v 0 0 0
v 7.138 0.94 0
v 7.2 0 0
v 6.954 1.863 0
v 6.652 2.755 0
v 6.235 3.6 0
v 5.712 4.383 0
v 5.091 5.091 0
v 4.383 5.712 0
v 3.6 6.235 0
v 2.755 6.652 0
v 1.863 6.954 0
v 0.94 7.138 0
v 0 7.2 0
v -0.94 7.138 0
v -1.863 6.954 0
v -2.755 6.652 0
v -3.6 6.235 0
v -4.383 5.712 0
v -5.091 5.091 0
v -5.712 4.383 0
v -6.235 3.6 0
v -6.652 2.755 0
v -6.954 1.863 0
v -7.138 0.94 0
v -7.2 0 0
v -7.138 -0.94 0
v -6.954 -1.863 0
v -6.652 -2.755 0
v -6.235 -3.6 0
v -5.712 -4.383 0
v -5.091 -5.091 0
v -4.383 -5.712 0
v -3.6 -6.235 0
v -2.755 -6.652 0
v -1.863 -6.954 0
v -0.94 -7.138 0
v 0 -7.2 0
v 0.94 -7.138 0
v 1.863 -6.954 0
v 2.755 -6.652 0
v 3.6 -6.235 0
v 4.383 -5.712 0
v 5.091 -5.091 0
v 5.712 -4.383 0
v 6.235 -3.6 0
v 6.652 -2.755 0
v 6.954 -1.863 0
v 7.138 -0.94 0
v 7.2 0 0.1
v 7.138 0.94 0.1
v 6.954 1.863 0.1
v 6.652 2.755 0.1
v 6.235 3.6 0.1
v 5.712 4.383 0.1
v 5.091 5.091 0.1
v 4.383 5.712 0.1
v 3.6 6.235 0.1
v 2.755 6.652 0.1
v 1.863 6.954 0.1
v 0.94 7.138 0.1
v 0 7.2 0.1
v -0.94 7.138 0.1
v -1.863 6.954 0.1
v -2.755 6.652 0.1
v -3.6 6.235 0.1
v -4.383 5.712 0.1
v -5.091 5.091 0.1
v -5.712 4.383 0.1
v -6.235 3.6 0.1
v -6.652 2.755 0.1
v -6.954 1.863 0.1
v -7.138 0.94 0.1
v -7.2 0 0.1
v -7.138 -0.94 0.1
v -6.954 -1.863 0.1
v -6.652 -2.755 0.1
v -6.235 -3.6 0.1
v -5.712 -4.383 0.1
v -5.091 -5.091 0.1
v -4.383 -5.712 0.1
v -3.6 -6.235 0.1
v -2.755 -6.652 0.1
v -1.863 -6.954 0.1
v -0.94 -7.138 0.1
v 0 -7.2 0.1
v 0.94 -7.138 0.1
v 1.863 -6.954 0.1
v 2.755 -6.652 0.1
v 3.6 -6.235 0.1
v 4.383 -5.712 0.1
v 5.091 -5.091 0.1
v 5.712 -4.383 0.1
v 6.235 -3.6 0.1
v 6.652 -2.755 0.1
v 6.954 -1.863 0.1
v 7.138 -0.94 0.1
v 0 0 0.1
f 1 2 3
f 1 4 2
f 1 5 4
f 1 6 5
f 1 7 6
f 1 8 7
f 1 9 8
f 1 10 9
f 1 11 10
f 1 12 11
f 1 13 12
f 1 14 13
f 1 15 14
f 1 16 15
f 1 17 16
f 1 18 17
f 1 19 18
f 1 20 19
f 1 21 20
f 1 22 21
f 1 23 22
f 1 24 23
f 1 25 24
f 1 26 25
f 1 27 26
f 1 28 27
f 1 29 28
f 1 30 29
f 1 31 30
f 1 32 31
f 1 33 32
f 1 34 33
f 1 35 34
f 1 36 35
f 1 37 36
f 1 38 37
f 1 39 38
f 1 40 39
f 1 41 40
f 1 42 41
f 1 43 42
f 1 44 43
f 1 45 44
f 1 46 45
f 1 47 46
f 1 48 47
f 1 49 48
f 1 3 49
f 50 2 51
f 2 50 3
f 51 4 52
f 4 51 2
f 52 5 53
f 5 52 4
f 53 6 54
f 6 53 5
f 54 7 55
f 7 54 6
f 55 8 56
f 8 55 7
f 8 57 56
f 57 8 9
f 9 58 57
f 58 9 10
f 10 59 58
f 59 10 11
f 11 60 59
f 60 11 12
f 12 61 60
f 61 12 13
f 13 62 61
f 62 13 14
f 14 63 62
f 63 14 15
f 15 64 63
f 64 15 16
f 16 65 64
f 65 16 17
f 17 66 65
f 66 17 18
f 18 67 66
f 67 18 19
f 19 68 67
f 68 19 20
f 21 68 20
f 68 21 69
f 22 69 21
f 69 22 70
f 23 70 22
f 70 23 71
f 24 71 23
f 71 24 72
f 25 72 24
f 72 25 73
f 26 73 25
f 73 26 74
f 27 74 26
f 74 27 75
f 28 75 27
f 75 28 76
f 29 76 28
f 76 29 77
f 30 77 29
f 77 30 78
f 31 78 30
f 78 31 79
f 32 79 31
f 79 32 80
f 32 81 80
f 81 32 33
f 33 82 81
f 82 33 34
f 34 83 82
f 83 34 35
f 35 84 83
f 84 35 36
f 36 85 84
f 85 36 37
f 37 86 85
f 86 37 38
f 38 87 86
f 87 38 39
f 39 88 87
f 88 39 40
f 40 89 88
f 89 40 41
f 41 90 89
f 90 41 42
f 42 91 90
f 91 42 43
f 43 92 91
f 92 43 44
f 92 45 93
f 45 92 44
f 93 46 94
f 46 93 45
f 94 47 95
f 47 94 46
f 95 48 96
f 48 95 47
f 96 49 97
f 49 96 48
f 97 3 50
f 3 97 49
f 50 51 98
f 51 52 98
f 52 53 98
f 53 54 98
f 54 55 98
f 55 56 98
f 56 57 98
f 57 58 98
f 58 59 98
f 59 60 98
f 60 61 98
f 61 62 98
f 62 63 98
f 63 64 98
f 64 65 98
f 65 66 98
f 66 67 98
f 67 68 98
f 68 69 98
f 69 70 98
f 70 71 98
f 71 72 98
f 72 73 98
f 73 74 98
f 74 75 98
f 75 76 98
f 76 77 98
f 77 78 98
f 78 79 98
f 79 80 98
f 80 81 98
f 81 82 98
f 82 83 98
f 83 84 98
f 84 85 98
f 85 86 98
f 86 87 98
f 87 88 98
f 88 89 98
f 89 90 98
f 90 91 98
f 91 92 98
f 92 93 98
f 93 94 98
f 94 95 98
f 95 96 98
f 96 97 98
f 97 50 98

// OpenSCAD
// file: ../p/48/1-4cyli.scad
use <../../lib.scad>
function ldraw_lib__48__1_4cyli() = [
// 0 Hi-Res Cylinder 0.25
// 0 Name: 48\1-4cyli.dat
// 0 Author: Manfred Moolhuysen
// 0 !LDRAW_ORG 48_Primitive UPDATE 2009-01
// 0 !LICENSE Licensed under CC BY 2.0 and CC BY 4.0 : see CAreadme.txt
// 
// 0 BFC CERTIFY CCW
  [0,"BFC","CERTIFY"],
  [0,"BFC","CCW"],
// 
// 0 !HISTORY 1999-07-05 [PTadmin] Official Update 1999-05
// 0 !HISTORY 2002-02-28 [hafhead] Added BFC statement
// 0 !HISTORY 2002-04-25 [PTadmin] Official Update 2002-02
// 0 !HISTORY 2007-06-24 [PTadmin] Header formatted for Contributor Agreement
// 0 !HISTORY 2008-07-01 [PTadmin] Official Update 2008-01
// 0 !HISTORY 2008-07-07 [guyvivan] Made BFC'ed CCW (2005-12-06)
// 0 !HISTORY 2009-05-02 [PTadmin] Official Update 2009-01
// 
// 
// 4 16 0.9914 0 0.1305 1 0 0 1 1 0 0.9914 1 0.1305
  [4,16,0.9914,0,0.1305,1,0,0,1,1,0,0.9914,1,0.1305],
// 4 16 0.9659 0 0.2588 0.9914 0 0.1305 0.9914 1 0.1305 0.9659 1 0.2588
  [4,16,0.9659,0,0.2588,0.9914,0,0.1305,0.9914,1,0.1305,0.9659,1,0.2588],
// 4 16 0.9239 0 0.3827 0.9659 0 0.2588 0.9659 1 0.2588 0.9239 1 0.3827
  [4,16,0.9239,0,0.3827,0.9659,0,0.2588,0.9659,1,0.2588,0.9239,1,0.3827],
// 4 16 0.866 0 0.5 0.9239 0 0.3827 0.9239 1 0.3827 0.866 1 0.5
  [4,16,0.866,0,0.5,0.9239,0,0.3827,0.9239,1,0.3827,0.866,1,0.5],
// 4 16 0.7934 0 0.6088 0.866 0 0.5 0.866 1 0.5 0.7934 1 0.6088
  [4,16,0.7934,0,0.6088,0.866,0,0.5,0.866,1,0.5,0.7934,1,0.6088],
// 4 16 0.7071 0 0.7071 0.7934 0 0.6088 0.7934 1 0.6088 0.7071 1 0.7071
  [4,16,0.7071,0,0.7071,0.7934,0,0.6088,0.7934,1,0.6088,0.7071,1,0.7071],
// 4 16 0.6088 0 0.7934 0.7071 0 0.7071 0.7071 1 0.7071 0.6088 1 0.7934
  [4,16,0.6088,0,0.7934,0.7071,0,0.7071,0.7071,1,0.7071,0.6088,1,0.7934],
// 4 16 0.5 0 0.866 0.6088 0 0.7934 0.6088 1 0.7934 0.5 1 0.866
  [4,16,0.5,0,0.866,0.6088,0,0.7934,0.6088,1,0.7934,0.5,1,0.866],
// 4 16 0.3827 0 0.9239 0.5 0 0.866 0.5 1 0.866 0.3827 1 0.9239
  [4,16,0.3827,0,0.9239,0.5,0,0.866,0.5,1,0.866,0.3827,1,0.9239],
// 4 16 0.2588 0 0.9659 0.3827 0 0.9239 0.3827 1 0.9239 0.2588 1 0.9659
  [4,16,0.2588,0,0.9659,0.3827,0,0.9239,0.3827,1,0.9239,0.2588,1,0.9659],
// 4 16 0.1305 0 0.9914 0.2588 0 0.9659 0.2588 1 0.9659 0.1305 1 0.9914
  [4,16,0.1305,0,0.9914,0.2588,0,0.9659,0.2588,1,0.9659,0.1305,1,0.9914],
// 4 16 0 0 1 0.1305 0 0.9914 0.1305 1 0.9914 0 1 1
  [4,16,0,0,1,0.1305,0,0.9914,0.1305,1,0.9914,0,1,1],
// 
// 0 conditional lines
// 5 24 1 1 0 1 0 0 1 1 -1 0.9914 1 0.1305
  [5,24,1,1,0,1,0,0,1,1,-1,0.9914,1,0.1305],
// 5 24 0.9914 1 0.1305 0.9914 0 0.1305 1 1 0 0.9659 1 0.2588
  [5,24,0.9914,1,0.1305,0.9914,0,0.1305,1,1,0,0.9659,1,0.2588],
// 5 24 0.9659 1 0.2588 0.9659 0 0.2588 0.9914 1 0.1305 0.9239 1 0.3827
  [5,24,0.9659,1,0.2588,0.9659,0,0.2588,0.9914,1,0.1305,0.9239,1,0.3827],
// 5 24 0.9239 1 0.3827 0.9239 0 0.3827 0.9659 1 0.2588 0.866 1 0.5
  [5,24,0.9239,1,0.3827,0.9239,0,0.3827,0.9659,1,0.2588,0.866,1,0.5],
// 5 24 0.866 1 0.5 0.866 0 0.5 0.9239 1 0.3827 0.7934 1 0.6088
  [5,24,0.866,1,0.5,0.866,0,0.5,0.9239,1,0.3827,0.7934,1,0.6088],
// 5 24 0.7934 1 0.6088 0.7934 0 0.6088 0.866 1 0.5 0.7071 1 0.7071
  [5,24,0.7934,1,0.6088,0.7934,0,0.6088,0.866,1,0.5,0.7071,1,0.7071],
// 5 24 0.7071 1 0.7071 0.7071 0 0.7071 0.7934 1 0.6088 0.6088 1 0.7934
  [5,24,0.7071,1,0.7071,0.7071,0,0.7071,0.7934,1,0.6088,0.6088,1,0.7934],
// 5 24 0.6088 1 0.7934 0.6088 0 0.7934 0.7071 1 0.7071 0.5 1 0.866
  [5,24,0.6088,1,0.7934,0.6088,0,0.7934,0.7071,1,0.7071,0.5,1,0.866],
// 5 24 0.5 1 0.866 0.5 0 0.866 0.6088 1 0.7934 0.3827 1 0.9239
  [5,24,0.5,1,0.866,0.5,0,0.866,0.6088,1,0.7934,0.3827,1,0.9239],
// 5 24 0.3827 1 0.9239 0.3827 0 0.9239 0.5 1 0.866 0.2588 1 0.9659
  [5,24,0.3827,1,0.9239,0.3827,0,0.9239,0.5,1,0.866,0.2588,1,0.9659],
// 5 24 0.2588 1 0.9659 0.2588 0 0.9659 0.3827 1 0.9239 0.1305 1 0.9914
  [5,24,0.2588,1,0.9659,0.2588,0,0.9659,0.3827,1,0.9239,0.1305,1,0.9914],
// 5 24 0.1305 1 0.9914 0.1305 0 0.9914 0.2588 1 0.9659 0 1 1
  [5,24,0.1305,1,0.9914,0.1305,0,0.9914,0.2588,1,0.9659,0,1,1],
// 5 24 0 1 1 0 0 1 0.1305 1 0.9914 -1 1 1
  [5,24,0,1,1,0,0,1,0.1305,1,0.9914,-1,1,1],
// 
// 0 end of file
];
module ldraw_lib__48__1_4cyli(step=0, col=false, unit=2/5, alt=false, line=0.2, solid=!$preview)
    makepoly(ldraw_lib__48__1_4cyli(), step=step, col=col, unit=unit, alt=alt, line=line, solid=solid);
ldraw_lib__48__1_4cyli(line=0.2);
// file: ../p/48/4-4cyli.scad
use <../../lib.scad>
use <1-4cyli.scad>
function ldraw_lib__48__4_4cyli() = [
// 0 Hi-Res Cylinder 1.0
// 0 Name: 48\4-4cyli.dat
// 0 Author: Paul Easter [pneaster]
// 0 !LDRAW_ORG 48_Primitive UPDATE 2012-02
// 0 !LICENSE Licensed under CC BY 2.0 and CC BY 4.0 : see CAreadme.txt
// 
// 0 BFC CERTIFY CCW
  [0,"BFC","CERTIFY"],
  [0,"BFC","CCW"],
// 
// 0 !HISTORY 2002-08-18 [PTadmin] Official Update 2002-04
// 0 !HISTORY 2007-06-24 [PTadmin] Header formatted for Contributor Agreement
// 0 !HISTORY 2008-07-01 [PTadmin] Official Update 2008-01
// 0 !HISTORY 2012-02-27 [Philo] Changed to CCW
// 0 !HISTORY 2012-08-09 [PTadmin] Official Update 2012-02
// 
// 
// 1 16 0 0 0 1 0 0 0 1 0 0 0 1 48\1-4cyli.dat
  [1,16,0,0,0,1,0,0,0,1,0,0,0,1, ldraw_lib__48__1_4cyli()],
// 1 16 0 0 0 0 0 -1 0 1 0 1 0 0 48\1-4cyli.dat
  [1,16,0,0,0,0,0,-1,0,1,0,1,0,0, ldraw_lib__48__1_4cyli()],
// 1 16 0 0 0 -1 0 0 0 1 0 0 0 -1 48\1-4cyli.dat
  [1,16,0,0,0,-1,0,0,0,1,0,0,0,-1, ldraw_lib__48__1_4cyli()],
// 1 16 0 0 0 0 0 1 0 1 0 -1 0 0 48\1-4cyli.dat
  [1,16,0,0,0,0,0,1,0,1,0,-1,0,0, ldraw_lib__48__1_4cyli()],
];
module ldraw_lib__48__4_4cyli(step=0, col=false, unit=2/5, alt=false, line=0.2, solid=!$preview)
    makepoly(ldraw_lib__48__4_4cyli(), step=step, col=col, unit=unit, alt=alt, line=line, solid=solid);
ldraw_lib__48__4_4cyli(line=0.2);
// file: ../p/48/4-4disc.scad
use <../../lib.scad>
function ldraw_lib__48__4_4disc() = [
// 0 Hi-Res Disc 1.0
// 0 Name: 48\4-4disc.dat
// 0 Author: Miklos Hosszu [hmick]
// 0 !LDRAW_ORG 48_Primitive UPDATE 2012-02
// 0 !LICENSE Licensed under CC BY 2.0 and CC BY 4.0 : see CAreadme.txt
// 
// 0 BFC CERTIFY CCW
  [0,"BFC","CERTIFY"],
  [0,"BFC","CCW"],
// 
// 0 !HISTORY 2004-11-06 [PTadmin] Official Update 2004-04
// 0 !HISTORY 2007-06-24 [PTadmin] Header formatted for Contributor Agreement
// 0 !HISTORY 2008-07-01 [PTadmin] Official Update 2008-01
// 0 !HISTORY 2012-02-27 [Philo] Changed to CCW
// 0 !HISTORY 2012-08-09 [PTadmin] Official Update 2012-02
// 
// 
// 3 16 1 0 0 0.9914 0 0.1305 0 0 0
  [3,16,1,0,0,0.9914,0,0.1305,0,0,0],
// 3 16 0.9914 0 0.1305 0.9659 0 0.2588 0 0 0
  [3,16,0.9914,0,0.1305,0.9659,0,0.2588,0,0,0],
// 3 16 0.9659 0 0.2588 0.9239 0 0.3827 0 0 0
  [3,16,0.9659,0,0.2588,0.9239,0,0.3827,0,0,0],
// 3 16 0.9239 0 0.3827 0.866 0 0.5 0 0 0
  [3,16,0.9239,0,0.3827,0.866,0,0.5,0,0,0],
// 3 16 0.866 0 0.5 0.7934 0 0.6088 0 0 0
  [3,16,0.866,0,0.5,0.7934,0,0.6088,0,0,0],
// 3 16 0.7934 0 0.6088 0.7071 0 0.7071 0 0 0
  [3,16,0.7934,0,0.6088,0.7071,0,0.7071,0,0,0],
// 3 16 0.7071 0 0.7071 0.6088 0 0.7934 0 0 0
  [3,16,0.7071,0,0.7071,0.6088,0,0.7934,0,0,0],
// 3 16 0.6088 0 0.7934 0.5 0 0.866 0 0 0
  [3,16,0.6088,0,0.7934,0.5,0,0.866,0,0,0],
// 3 16 0.5 0 0.866 0.3827 0 0.9239 0 0 0
  [3,16,0.5,0,0.866,0.3827,0,0.9239,0,0,0],
// 3 16 0.3827 0 0.9239 0.2588 0 0.9659 0 0 0
  [3,16,0.3827,0,0.9239,0.2588,0,0.9659,0,0,0],
// 3 16 0.2588 0 0.9659 0.1305 0 0.9914 0 0 0
  [3,16,0.2588,0,0.9659,0.1305,0,0.9914,0,0,0],
// 3 16 0.1305 0 0.9914 0 0 1 0 0 0
  [3,16,0.1305,0,0.9914,0,0,1,0,0,0],
// 3 16 0 0 1 -0.1305 0 0.9914 0 0 0
  [3,16,0,0,1,-0.1305,0,0.9914,0,0,0],
// 3 16 -0.1305 0 0.9914 -0.2588 0 0.9659 0 0 0
  [3,16,-0.1305,0,0.9914,-0.2588,0,0.9659,0,0,0],
// 3 16 -0.2588 0 0.9659 -0.3827 0 0.9239 0 0 0
  [3,16,-0.2588,0,0.9659,-0.3827,0,0.9239,0,0,0],
// 3 16 -0.3827 0 0.9239 -0.5 0 0.866 0 0 0
  [3,16,-0.3827,0,0.9239,-0.5,0,0.866,0,0,0],
// 3 16 -0.5 0 0.866 -0.6088 0 0.7934 0 0 0
  [3,16,-0.5,0,0.866,-0.6088,0,0.7934,0,0,0],
// 3 16 -0.6088 0 0.7934 -0.7071 0 0.7071 0 0 0
  [3,16,-0.6088,0,0.7934,-0.7071,0,0.7071,0,0,0],
// 3 16 -0.7071 0 0.7071 -0.7934 0 0.6088 0 0 0
  [3,16,-0.7071,0,0.7071,-0.7934,0,0.6088,0,0,0],
// 3 16 -0.7934 0 0.6088 -0.866 0 0.5 0 0 0
  [3,16,-0.7934,0,0.6088,-0.866,0,0.5,0,0,0],
// 3 16 -0.866 0 0.5 -0.9239 0 0.3827 0 0 0
  [3,16,-0.866,0,0.5,-0.9239,0,0.3827,0,0,0],
// 3 16 -0.9239 0 0.3827 -0.9659 0 0.2588 0 0 0
  [3,16,-0.9239,0,0.3827,-0.9659,0,0.2588,0,0,0],
// 3 16 -0.9659 0 0.2588 -0.9914 0 0.1305 0 0 0
  [3,16,-0.9659,0,0.2588,-0.9914,0,0.1305,0,0,0],
// 3 16 -0.9914 0 0.1305 -1 0 0 0 0 0
  [3,16,-0.9914,0,0.1305,-1,0,0,0,0,0],
// 3 16 -1 0 0 -0.9914 0 -0.1305 0 0 0
  [3,16,-1,0,0,-0.9914,0,-0.1305,0,0,0],
// 3 16 -0.9914 0 -0.1305 -0.9659 0 -0.2588 0 0 0
  [3,16,-0.9914,0,-0.1305,-0.9659,0,-0.2588,0,0,0],
// 3 16 -0.9659 0 -0.2588 -0.9239 0 -0.3827 0 0 0
  [3,16,-0.9659,0,-0.2588,-0.9239,0,-0.3827,0,0,0],
// 3 16 -0.9239 0 -0.3827 -0.866 0 -0.5 0 0 0
  [3,16,-0.9239,0,-0.3827,-0.866,0,-0.5,0,0,0],
// 3 16 -0.866 0 -0.5 -0.7934 0 -0.6088 0 0 0
  [3,16,-0.866,0,-0.5,-0.7934,0,-0.6088,0,0,0],
// 3 16 -0.7934 0 -0.6088 -0.7071 0 -0.7071 0 0 0
  [3,16,-0.7934,0,-0.6088,-0.7071,0,-0.7071,0,0,0],
// 3 16 -0.7071 0 -0.7071 -0.6088 0 -0.7934 0 0 0
  [3,16,-0.7071,0,-0.7071,-0.6088,0,-0.7934,0,0,0],
// 3 16 -0.6088 0 -0.7934 -0.5 0 -0.866 0 0 0
  [3,16,-0.6088,0,-0.7934,-0.5,0,-0.866,0,0,0],
// 3 16 -0.5 0 -0.866 -0.3827 0 -0.9239 0 0 0
  [3,16,-0.5,0,-0.866,-0.3827,0,-0.9239,0,0,0],
// 3 16 -0.3827 0 -0.9239 -0.2588 0 -0.9659 0 0 0
  [3,16,-0.3827,0,-0.9239,-0.2588,0,-0.9659,0,0,0],
// 3 16 -0.2588 0 -0.9659 -0.1305 0 -0.9914 0 0 0
  [3,16,-0.2588,0,-0.9659,-0.1305,0,-0.9914,0,0,0],
// 3 16 -0.1305 0 -0.9914 0 0 -1 0 0 0
  [3,16,-0.1305,0,-0.9914,0,0,-1,0,0,0],
// 3 16 0 0 -1 0.1305 0 -0.9914 0 0 0
  [3,16,0,0,-1,0.1305,0,-0.9914,0,0,0],
// 3 16 0.1305 0 -0.9914 0.2588 0 -0.9659 0 0 0
  [3,16,0.1305,0,-0.9914,0.2588,0,-0.9659,0,0,0],
// 3 16 0.2588 0 -0.9659 0.3827 0 -0.9239 0 0 0
  [3,16,0.2588,0,-0.9659,0.3827,0,-0.9239,0,0,0],
// 3 16 0.3827 0 -0.9239 0.5 0 -0.866 0 0 0
  [3,16,0.3827,0,-0.9239,0.5,0,-0.866,0,0,0],
// 3 16 0.5 0 -0.866 0.6088 0 -0.7934 0 0 0
  [3,16,0.5,0,-0.866,0.6088,0,-0.7934,0,0,0],
// 3 16 0.6088 0 -0.7934 0.7071 0 -0.7071 0 0 0
  [3,16,0.6088,0,-0.7934,0.7071,0,-0.7071,0,0,0],
// 3 16 0.7071 0 -0.7071 0.7934 0 -0.6088 0 0 0
  [3,16,0.7071,0,-0.7071,0.7934,0,-0.6088,0,0,0],
// 3 16 0.7934 0 -0.6088 0.866 0 -0.5 0 0 0
  [3,16,0.7934,0,-0.6088,0.866,0,-0.5,0,0,0],
// 3 16 0.866 0 -0.5 0.9239 0 -0.3827 0 0 0
  [3,16,0.866,0,-0.5,0.9239,0,-0.3827,0,0,0],
// 3 16 0.9239 0 -0.3827 0.9659 0 -0.2588 0 0 0
  [3,16,0.9239,0,-0.3827,0.9659,0,-0.2588,0,0,0],
// 3 16 0.9659 0 -0.2588 0.9914 0 -0.1305 0 0 0
  [3,16,0.9659,0,-0.2588,0.9914,0,-0.1305,0,0,0],
// 3 16 0.9914 0 -0.1305 1 0 0 0 0 0
  [3,16,0.9914,0,-0.1305,1,0,0,0,0,0],
];
module ldraw_lib__48__4_4disc(step=0, col=false, unit=2/5, alt=false, line=0.2, solid=!$preview)
    makepoly(ldraw_lib__48__4_4disc(), step=step, col=col, unit=unit, alt=alt, line=line, solid=solid);
ldraw_lib__48__4_4disc(line=0.2);
// file: ../p/48/4-4cylc3.scad
use <../../lib.scad>
use <4-4cyli.scad>
use <4-4disc.scad>
function ldraw_lib__48__4_4cylc3() = [
// 0 Hi-Res Cylinder Closed 1.0 without Top or Bottom Edge Lines
// 0 Name: 48\4-4cylc3.dat
// 0 Author: Chris Dee [cwdee]
// 0 !LDRAW_ORG 48_Primitive UPDATE 2017-01
// 0 !LICENSE Licensed under CC BY 2.0 and CC BY 4.0 : see CAreadme.txt
// 
// 0 BFC CERTIFY CCW
  [0,"BFC","CERTIFY"],
  [0,"BFC","CCW"],
// 
// 0 !HISTORY 2017-12-30 [PTadmin] Official Update 2017-01
// 
// 
// 1 16 0 0 0 1 0 0 0 1 0 0 0 1 48\4-4disc.dat
  [1,16,0,0,0,1,0,0,0,1,0,0,0,1, ldraw_lib__48__4_4disc()],
// 1 16 0 0 0 1 0 0 0 1 0 0 0 1 48\4-4cyli.dat
  [1,16,0,0,0,1,0,0,0,1,0,0,0,1, ldraw_lib__48__4_4cyli()],
// 0
];
module ldraw_lib__48__4_4cylc3(step=0, col=false, unit=2/5, alt=false, line=0.2, solid=!$preview)
    makepoly(ldraw_lib__48__4_4cylc3(), step=step, col=col, unit=unit, alt=alt, line=line, solid=solid);
ldraw_lib__48__4_4cylc3(line=0.2);
// main file
use <../lib.scad>
use <../p/48/4-4cylc3.scad>
use <../p/48/4-4disc.scad>
function ldraw_lib__6196607c() = [
// 0 Sticker  1.7 x  1.7 Round Chrome Gold
// 0 Name: 6196607c.dat
// 0 Author: Evert-Jan Boer [ejboer]
// 0 !LDRAW_ORG Part UPDATE 2022-01
// 0 !LICENSE Licensed under CC BY 2.0 and CC BY 4.0 : see CAreadme.txt
// 
// 0 BFC CERTIFY CCW
  [0,"BFC","CERTIFY"],
  [0,"BFC","CCW"],
// 
// 0 !KEYWORDS Carousel, Set 10257
// 
// 0 !HISTORY 2022-01-14 [PTadmin] Official Update 2022-01
// 
// 
// 1 16 0 0 0 18 0 0 0 -0.25 0 0 0 18 48\4-4cylc3.dat
  [1,16,0,0,0,18,0,0,0,-0.25,0,0,0,18, ldraw_lib__48__4_4cylc3()],
// 1 334 0 -0.25 0 18 0 0 0 1 0 0 0 18 48\4-4disc.dat
  [1,334,0,-0.25,0,18,0,0,0,1,0,0,0,18, ldraw_lib__48__4_4disc()],
];
module ldraw_lib__6196607c(step=0, col=false, unit=2/5, alt=false, line=0.2, solid=!$preview)
    makepoly(ldraw_lib__6196607c(), step=step, col=col, unit=unit, alt=alt, line=line, solid=solid);
ldraw_lib__6196607c(line=0.2);
